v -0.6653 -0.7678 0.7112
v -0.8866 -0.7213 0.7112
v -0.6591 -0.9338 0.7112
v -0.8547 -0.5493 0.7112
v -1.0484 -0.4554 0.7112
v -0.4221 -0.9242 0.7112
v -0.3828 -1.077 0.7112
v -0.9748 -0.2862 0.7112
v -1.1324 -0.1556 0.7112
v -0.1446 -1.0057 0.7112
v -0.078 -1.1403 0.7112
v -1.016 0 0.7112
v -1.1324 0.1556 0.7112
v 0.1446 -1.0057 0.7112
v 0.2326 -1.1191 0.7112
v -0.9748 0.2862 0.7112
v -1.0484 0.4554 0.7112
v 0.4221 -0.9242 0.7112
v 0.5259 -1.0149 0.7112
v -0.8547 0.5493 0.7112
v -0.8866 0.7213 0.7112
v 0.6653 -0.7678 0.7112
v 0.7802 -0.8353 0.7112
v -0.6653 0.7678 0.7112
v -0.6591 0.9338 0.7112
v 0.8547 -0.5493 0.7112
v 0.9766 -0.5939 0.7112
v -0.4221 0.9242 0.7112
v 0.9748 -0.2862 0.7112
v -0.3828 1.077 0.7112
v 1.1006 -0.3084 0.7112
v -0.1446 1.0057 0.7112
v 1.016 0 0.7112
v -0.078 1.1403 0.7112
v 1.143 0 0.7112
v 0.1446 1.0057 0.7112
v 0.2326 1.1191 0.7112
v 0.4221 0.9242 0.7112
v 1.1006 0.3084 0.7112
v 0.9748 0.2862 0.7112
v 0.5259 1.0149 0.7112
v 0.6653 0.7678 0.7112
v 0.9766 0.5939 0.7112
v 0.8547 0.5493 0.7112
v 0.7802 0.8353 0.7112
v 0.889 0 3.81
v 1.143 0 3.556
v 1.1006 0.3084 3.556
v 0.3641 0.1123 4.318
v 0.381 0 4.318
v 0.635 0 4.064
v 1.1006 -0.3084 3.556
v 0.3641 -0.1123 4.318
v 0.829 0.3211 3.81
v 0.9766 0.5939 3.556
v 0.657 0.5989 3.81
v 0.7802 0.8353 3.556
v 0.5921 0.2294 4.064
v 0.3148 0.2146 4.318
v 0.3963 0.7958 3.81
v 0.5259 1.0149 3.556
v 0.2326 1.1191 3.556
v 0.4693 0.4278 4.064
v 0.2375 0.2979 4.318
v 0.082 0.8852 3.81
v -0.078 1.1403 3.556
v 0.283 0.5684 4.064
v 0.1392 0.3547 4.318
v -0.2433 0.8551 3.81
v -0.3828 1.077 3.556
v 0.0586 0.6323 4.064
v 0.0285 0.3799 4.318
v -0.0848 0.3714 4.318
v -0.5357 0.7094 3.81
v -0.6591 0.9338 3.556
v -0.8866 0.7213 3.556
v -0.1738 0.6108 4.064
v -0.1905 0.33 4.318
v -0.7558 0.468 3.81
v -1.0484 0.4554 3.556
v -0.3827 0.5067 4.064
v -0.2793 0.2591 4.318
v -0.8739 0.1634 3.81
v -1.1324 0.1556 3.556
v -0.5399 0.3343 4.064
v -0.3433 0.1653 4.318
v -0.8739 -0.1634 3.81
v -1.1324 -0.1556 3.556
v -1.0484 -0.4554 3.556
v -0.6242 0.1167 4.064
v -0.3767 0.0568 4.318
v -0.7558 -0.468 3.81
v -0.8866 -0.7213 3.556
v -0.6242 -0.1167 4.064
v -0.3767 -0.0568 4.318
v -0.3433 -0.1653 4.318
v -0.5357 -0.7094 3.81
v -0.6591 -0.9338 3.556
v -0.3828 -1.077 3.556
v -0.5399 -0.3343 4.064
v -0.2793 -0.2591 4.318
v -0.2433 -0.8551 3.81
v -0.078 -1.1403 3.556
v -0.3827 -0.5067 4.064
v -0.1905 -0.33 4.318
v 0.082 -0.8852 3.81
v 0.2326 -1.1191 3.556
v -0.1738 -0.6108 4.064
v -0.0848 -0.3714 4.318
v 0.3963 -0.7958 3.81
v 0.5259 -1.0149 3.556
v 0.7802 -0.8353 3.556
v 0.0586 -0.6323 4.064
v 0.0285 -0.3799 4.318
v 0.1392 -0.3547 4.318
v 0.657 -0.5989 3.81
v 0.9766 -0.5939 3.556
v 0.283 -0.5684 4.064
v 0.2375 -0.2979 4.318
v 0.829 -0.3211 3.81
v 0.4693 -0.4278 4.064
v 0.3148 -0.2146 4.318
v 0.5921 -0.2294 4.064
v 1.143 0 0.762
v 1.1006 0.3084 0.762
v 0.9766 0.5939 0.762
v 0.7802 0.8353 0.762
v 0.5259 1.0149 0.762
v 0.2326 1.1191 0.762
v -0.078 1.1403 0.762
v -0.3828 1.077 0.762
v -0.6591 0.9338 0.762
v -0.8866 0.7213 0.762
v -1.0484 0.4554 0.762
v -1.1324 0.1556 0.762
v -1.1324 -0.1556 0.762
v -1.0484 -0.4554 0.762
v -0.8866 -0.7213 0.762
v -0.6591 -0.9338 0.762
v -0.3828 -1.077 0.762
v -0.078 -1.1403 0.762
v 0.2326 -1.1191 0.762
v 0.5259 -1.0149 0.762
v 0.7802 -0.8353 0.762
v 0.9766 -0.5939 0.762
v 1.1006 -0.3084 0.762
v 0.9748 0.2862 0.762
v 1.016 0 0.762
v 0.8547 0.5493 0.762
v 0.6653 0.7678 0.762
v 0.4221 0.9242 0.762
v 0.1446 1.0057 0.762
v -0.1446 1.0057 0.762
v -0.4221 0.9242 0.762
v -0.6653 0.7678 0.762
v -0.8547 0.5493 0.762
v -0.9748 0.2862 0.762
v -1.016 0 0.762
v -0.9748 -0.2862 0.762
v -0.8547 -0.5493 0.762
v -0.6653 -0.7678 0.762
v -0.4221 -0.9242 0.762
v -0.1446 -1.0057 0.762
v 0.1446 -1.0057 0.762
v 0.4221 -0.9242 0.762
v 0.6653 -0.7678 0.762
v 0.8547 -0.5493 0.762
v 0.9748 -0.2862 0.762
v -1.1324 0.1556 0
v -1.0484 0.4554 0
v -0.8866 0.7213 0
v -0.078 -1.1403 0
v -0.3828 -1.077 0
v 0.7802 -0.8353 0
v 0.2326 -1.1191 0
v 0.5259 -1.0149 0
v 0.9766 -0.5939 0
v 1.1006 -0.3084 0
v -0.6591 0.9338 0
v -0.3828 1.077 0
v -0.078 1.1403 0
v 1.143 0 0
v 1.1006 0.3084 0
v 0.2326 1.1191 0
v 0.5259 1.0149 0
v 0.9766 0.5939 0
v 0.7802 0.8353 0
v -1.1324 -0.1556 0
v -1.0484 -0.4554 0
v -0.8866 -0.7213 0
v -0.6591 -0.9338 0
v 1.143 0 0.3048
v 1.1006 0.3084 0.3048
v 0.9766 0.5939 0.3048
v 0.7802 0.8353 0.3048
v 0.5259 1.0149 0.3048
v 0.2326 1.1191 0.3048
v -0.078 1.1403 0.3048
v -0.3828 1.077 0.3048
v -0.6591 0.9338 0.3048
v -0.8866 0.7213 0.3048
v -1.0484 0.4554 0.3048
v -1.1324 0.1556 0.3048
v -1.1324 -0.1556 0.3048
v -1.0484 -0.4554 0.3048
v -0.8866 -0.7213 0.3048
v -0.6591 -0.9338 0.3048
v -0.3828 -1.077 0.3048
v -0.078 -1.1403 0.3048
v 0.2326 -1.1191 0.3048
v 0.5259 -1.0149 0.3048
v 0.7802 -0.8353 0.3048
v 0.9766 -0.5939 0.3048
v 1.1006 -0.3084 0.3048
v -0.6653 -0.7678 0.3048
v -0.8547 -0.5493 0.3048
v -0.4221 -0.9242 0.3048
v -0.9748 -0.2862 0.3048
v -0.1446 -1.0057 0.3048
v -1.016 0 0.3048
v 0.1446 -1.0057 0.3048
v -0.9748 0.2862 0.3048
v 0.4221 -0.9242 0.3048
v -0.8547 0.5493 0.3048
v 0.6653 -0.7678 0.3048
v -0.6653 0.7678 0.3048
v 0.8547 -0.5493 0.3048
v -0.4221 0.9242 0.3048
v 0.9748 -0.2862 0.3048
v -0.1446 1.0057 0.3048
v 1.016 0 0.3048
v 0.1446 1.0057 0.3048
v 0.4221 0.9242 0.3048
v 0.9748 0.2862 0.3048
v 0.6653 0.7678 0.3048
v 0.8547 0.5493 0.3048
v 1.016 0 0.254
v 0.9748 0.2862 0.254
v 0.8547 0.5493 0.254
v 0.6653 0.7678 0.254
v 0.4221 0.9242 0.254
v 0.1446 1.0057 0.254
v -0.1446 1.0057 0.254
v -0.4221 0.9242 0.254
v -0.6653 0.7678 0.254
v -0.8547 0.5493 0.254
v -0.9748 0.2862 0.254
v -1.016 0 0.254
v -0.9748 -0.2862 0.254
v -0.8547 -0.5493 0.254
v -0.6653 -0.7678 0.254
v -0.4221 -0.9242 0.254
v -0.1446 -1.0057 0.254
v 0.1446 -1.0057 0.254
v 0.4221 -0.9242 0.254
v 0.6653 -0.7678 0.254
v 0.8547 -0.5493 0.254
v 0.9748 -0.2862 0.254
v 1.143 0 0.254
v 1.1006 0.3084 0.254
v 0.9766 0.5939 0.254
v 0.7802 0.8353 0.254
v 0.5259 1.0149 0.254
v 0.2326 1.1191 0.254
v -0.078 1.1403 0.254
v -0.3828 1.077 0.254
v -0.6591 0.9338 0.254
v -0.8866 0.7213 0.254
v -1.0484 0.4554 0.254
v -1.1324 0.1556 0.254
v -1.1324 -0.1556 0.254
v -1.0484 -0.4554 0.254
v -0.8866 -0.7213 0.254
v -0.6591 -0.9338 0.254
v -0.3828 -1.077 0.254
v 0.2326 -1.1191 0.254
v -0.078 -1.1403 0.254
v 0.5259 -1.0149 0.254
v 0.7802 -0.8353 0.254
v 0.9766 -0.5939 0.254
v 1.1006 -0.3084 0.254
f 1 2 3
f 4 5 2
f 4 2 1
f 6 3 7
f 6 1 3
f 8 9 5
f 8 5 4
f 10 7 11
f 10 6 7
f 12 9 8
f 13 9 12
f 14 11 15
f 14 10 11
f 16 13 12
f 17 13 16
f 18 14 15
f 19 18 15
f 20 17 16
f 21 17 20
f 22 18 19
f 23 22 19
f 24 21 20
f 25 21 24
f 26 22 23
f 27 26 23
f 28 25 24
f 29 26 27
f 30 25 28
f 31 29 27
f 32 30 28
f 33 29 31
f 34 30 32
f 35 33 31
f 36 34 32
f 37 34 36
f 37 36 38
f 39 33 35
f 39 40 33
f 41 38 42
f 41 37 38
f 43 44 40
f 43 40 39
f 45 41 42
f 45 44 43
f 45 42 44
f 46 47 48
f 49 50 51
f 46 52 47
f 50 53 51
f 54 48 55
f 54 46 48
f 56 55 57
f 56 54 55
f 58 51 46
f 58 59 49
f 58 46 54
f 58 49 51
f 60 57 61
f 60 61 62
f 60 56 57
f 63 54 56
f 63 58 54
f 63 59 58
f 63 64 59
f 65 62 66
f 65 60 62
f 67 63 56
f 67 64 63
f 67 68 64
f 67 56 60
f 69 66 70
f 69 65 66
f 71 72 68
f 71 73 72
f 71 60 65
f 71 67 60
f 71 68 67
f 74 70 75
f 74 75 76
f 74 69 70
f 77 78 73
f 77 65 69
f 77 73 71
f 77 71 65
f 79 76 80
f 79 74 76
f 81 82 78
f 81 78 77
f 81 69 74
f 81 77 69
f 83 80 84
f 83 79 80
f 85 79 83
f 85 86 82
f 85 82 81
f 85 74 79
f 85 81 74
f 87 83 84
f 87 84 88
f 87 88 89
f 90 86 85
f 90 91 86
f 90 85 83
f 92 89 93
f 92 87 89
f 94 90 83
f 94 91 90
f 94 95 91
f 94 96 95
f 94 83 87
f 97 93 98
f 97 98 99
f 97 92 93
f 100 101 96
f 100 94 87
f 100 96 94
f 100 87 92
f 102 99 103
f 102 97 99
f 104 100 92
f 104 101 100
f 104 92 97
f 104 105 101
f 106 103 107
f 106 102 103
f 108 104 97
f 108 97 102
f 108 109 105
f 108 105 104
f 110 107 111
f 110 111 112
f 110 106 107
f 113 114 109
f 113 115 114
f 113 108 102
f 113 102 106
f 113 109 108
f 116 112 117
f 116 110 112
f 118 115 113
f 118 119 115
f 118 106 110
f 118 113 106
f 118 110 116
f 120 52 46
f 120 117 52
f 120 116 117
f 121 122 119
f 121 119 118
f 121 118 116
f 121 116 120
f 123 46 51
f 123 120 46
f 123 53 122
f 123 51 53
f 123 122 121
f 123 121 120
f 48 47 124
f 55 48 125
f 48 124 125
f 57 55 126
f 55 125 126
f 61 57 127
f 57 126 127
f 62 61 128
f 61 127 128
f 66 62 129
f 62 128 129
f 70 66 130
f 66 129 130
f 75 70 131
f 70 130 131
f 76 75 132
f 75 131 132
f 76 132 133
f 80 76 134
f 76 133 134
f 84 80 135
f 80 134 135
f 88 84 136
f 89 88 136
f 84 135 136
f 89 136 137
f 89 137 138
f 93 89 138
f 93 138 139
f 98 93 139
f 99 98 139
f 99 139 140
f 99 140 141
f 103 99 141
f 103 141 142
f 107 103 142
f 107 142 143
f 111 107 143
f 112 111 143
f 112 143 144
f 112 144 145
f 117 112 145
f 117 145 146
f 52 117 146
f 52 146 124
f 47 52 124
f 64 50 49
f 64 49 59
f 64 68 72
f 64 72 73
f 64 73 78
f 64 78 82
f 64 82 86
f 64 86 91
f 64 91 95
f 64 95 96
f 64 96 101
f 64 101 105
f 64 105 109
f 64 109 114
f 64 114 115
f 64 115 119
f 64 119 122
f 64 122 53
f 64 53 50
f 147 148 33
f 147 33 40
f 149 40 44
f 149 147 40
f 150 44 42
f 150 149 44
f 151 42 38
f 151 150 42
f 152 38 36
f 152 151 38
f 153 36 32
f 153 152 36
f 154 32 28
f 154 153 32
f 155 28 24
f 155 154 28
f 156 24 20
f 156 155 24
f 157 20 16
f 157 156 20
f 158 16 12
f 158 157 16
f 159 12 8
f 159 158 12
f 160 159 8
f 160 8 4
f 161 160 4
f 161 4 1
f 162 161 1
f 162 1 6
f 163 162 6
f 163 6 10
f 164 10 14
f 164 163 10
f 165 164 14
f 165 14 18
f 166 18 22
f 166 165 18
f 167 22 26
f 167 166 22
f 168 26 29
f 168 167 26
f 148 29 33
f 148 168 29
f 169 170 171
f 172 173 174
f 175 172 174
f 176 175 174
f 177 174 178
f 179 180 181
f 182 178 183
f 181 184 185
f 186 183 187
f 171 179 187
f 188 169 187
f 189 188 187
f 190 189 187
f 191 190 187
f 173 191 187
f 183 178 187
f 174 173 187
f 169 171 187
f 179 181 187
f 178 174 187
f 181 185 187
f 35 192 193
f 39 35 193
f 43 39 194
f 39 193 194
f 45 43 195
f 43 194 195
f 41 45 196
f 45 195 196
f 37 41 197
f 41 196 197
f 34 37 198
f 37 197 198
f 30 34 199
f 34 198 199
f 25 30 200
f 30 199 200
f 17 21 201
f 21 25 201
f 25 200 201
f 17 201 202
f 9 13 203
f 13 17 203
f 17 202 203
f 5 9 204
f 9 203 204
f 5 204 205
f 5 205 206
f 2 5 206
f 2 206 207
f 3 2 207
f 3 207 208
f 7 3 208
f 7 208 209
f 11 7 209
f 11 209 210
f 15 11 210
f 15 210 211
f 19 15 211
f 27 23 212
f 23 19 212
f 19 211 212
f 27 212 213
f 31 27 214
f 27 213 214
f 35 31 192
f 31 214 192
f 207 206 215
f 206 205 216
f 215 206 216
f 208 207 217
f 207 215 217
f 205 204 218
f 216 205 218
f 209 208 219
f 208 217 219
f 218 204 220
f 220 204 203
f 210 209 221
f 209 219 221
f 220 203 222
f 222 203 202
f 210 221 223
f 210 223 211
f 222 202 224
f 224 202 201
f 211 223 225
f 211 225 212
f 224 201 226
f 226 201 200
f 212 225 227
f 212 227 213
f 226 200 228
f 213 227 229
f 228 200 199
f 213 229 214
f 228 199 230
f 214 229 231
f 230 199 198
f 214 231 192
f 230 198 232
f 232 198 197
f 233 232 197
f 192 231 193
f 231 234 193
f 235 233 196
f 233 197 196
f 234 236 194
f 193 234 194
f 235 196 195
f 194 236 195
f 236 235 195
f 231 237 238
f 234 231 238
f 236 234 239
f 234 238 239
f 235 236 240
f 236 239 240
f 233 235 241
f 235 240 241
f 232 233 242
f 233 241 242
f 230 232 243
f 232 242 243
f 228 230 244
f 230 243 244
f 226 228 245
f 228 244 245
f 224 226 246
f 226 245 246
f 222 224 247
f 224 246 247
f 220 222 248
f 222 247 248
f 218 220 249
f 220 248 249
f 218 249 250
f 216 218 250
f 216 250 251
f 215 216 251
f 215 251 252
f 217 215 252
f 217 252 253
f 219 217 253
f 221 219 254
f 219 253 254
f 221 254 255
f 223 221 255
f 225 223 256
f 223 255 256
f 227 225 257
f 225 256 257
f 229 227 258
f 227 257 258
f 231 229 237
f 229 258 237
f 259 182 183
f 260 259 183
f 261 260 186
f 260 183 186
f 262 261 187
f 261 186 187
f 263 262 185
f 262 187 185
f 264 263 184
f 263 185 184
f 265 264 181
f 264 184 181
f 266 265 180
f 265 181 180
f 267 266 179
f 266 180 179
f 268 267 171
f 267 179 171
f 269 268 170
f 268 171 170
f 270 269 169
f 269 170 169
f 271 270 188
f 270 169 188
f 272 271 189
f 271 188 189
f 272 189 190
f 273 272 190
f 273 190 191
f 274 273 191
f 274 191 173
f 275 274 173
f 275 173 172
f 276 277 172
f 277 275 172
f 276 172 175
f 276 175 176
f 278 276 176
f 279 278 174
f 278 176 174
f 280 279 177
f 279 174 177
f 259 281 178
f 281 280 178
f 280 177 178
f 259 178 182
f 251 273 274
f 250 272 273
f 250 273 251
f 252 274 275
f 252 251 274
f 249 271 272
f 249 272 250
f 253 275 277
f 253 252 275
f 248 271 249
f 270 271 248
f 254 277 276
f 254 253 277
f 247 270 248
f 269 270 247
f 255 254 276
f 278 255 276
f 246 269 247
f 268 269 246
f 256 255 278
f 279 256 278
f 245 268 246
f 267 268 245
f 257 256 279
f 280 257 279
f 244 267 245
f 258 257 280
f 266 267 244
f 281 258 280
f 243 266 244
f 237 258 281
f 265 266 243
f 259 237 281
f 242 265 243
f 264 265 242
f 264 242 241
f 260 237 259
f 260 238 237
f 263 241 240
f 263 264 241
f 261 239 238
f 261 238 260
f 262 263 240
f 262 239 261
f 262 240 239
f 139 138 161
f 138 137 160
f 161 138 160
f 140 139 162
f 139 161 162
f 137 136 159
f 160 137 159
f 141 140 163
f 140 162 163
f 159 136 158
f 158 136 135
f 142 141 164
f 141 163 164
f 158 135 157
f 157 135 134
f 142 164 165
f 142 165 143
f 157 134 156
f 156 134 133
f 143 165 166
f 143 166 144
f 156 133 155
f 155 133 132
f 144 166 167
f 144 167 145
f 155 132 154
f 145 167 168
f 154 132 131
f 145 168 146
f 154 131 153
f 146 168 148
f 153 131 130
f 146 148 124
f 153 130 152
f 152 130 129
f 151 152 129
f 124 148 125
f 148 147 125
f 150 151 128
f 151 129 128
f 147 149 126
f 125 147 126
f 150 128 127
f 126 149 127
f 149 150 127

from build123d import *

# Parameters (mm, degrees)
F0_R     = 1.143
F1_DEPTH = 4.318
F4_R     = 1.1557
F4_R_2   = 1.016
F5_DEPTH = 0.0508
F6_R     = 1.1557
F6_R_2   = 1.016
F7_DEPTH = 0.0508
F8_SIZE  = 0.762


with BuildPart() as f1:
    # F0 (on Top) → F1 (new body)
    with BuildSketch(Plane.XY):
        Circle(F0_R)
    extrude(amount=F1_DEPTH)

    # F4 (on offset) → F5 (cut)
    with BuildSketch(Plane.XY.offset(0.254)):
        Circle(F4_R)
        Circle(F4_R_2, mode=Mode.SUBTRACT)
    extrude(amount=F5_DEPTH, mode=Mode.SUBTRACT)

    # F6 (on offset) → F7 (cut)
    with BuildSketch(Plane.XY.offset(0.762)):
        Circle(F6_R)
        Circle(F6_R_2, mode=Mode.SUBTRACT)
    extrude(amount=-F7_DEPTH, mode=Mode.SUBTRACT)

    # F8
    f8_edges = [f1.edges().sort_by_distance(p)[0] for p in [
        (-1.143, 0, 4.318),
    ]]
    chamfer(f8_edges, length=F8_SIZE)


solid = f1.part
